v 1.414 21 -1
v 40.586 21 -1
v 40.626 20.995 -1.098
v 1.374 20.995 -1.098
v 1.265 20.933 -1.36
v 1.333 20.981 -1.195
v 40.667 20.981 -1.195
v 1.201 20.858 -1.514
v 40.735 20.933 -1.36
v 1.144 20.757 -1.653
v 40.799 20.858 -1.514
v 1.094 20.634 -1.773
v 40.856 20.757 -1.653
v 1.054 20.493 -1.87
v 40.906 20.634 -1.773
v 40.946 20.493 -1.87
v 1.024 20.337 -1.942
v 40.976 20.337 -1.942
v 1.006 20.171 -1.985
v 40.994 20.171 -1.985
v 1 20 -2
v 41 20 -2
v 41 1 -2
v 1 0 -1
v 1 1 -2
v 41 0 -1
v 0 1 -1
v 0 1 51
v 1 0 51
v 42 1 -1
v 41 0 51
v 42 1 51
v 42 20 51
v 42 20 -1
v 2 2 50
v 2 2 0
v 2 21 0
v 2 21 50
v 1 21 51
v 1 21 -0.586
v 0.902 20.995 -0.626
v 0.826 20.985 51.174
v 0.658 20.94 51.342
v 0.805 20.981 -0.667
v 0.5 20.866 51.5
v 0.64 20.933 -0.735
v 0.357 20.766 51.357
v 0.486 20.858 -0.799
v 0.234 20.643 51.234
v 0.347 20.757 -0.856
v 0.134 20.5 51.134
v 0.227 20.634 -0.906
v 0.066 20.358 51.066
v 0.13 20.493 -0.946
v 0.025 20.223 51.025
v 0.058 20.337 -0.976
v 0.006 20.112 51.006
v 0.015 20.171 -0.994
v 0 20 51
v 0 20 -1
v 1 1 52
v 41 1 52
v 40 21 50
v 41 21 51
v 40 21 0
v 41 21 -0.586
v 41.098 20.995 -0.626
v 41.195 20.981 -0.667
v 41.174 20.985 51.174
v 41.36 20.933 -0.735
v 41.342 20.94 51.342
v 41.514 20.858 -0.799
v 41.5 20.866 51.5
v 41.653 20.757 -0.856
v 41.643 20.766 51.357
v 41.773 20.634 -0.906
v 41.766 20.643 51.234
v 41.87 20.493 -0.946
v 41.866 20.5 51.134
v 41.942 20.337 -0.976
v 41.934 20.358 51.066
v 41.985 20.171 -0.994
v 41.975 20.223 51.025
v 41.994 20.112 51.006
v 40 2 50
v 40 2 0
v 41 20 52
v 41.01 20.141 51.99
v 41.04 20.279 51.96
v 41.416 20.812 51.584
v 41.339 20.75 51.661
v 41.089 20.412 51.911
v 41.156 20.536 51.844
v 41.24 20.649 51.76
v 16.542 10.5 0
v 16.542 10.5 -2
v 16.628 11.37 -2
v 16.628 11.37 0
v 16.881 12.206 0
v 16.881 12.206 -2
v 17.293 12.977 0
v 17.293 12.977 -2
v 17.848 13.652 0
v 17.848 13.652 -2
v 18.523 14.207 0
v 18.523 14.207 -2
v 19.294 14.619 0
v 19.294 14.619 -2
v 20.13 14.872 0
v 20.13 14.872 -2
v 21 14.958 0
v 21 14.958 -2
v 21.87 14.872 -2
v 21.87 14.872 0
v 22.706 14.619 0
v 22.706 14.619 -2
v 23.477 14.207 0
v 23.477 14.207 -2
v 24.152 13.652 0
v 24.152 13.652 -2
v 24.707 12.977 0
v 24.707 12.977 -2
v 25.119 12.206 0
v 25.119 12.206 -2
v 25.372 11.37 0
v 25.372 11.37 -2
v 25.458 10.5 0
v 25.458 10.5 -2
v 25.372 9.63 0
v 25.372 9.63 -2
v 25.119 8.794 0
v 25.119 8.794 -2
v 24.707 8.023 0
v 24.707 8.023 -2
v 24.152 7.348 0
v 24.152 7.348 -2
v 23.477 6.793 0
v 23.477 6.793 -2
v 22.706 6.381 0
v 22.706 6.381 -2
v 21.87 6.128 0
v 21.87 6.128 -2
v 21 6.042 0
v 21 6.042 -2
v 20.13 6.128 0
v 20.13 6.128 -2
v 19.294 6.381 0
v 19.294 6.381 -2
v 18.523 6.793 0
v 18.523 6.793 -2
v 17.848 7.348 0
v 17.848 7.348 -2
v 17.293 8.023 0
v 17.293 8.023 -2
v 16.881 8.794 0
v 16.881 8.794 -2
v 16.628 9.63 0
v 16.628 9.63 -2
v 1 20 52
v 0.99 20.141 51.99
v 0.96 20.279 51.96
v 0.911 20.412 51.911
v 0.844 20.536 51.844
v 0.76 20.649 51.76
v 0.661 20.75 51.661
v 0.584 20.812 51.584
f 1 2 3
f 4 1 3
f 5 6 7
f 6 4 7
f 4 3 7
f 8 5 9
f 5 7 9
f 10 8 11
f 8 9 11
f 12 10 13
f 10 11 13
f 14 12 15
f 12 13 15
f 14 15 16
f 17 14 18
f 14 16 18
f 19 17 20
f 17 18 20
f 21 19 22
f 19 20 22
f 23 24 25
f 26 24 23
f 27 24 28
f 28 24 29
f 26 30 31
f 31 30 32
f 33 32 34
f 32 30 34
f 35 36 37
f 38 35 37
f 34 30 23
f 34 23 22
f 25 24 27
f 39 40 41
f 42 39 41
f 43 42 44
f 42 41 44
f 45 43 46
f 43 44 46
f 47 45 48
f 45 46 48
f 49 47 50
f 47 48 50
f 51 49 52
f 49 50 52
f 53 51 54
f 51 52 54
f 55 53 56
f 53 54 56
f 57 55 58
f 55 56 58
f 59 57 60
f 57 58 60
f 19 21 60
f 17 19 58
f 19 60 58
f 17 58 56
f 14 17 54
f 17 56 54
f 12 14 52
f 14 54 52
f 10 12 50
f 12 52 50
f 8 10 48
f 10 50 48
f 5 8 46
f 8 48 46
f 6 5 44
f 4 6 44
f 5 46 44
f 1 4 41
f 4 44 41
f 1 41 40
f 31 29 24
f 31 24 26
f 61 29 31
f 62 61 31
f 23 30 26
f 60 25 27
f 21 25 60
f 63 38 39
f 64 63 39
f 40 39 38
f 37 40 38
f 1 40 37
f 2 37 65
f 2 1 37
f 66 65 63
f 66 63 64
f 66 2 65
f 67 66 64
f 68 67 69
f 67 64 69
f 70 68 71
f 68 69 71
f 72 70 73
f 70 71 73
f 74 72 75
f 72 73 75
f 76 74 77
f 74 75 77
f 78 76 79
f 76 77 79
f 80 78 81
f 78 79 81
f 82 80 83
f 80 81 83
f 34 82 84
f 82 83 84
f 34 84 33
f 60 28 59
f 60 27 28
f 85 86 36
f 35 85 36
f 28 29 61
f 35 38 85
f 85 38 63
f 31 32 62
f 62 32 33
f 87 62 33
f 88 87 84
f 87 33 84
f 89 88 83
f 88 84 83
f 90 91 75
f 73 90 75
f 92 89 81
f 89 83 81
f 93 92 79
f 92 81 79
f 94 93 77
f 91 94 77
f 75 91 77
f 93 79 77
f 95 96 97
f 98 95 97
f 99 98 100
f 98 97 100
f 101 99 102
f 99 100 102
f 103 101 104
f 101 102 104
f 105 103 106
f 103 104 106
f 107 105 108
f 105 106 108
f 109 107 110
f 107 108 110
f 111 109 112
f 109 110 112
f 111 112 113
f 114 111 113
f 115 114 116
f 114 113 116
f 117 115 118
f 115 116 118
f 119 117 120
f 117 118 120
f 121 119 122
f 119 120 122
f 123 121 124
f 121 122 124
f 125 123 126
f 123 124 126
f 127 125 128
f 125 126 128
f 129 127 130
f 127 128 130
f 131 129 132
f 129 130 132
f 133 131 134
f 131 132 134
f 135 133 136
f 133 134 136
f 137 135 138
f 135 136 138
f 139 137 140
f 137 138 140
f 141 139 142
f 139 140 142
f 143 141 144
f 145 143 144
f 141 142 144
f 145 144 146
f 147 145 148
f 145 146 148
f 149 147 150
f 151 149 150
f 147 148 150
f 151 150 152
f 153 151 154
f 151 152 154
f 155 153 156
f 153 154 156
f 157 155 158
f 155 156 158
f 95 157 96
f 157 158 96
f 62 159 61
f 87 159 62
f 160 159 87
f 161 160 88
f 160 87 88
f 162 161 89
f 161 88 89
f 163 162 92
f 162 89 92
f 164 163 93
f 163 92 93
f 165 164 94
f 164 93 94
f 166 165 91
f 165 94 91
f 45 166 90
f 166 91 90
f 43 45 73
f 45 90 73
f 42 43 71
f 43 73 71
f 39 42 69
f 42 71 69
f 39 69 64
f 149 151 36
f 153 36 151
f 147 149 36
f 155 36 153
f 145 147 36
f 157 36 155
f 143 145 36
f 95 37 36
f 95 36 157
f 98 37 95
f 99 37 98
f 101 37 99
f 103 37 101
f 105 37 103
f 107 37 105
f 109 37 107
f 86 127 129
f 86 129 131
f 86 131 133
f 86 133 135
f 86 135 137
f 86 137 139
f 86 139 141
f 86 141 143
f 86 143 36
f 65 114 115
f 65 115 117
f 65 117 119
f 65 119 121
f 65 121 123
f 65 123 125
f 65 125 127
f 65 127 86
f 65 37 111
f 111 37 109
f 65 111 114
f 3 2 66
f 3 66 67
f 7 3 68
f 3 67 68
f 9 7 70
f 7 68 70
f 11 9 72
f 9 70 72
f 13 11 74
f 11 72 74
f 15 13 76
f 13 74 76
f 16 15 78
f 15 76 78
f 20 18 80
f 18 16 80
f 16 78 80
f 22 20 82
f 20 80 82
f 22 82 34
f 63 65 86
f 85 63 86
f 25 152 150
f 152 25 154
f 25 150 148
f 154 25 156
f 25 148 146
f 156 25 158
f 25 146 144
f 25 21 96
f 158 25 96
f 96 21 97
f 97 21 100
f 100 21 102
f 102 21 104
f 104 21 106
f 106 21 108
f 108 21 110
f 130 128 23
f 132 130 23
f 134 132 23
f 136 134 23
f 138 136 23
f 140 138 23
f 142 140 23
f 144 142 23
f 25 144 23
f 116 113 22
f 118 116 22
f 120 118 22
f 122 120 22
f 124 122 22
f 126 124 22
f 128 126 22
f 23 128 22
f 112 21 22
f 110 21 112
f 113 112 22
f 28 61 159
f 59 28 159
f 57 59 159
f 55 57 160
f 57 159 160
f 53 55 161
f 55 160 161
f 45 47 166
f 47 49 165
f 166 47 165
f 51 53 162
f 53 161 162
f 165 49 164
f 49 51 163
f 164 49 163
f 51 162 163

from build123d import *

# Parameters (mm, degrees)
BOSS_EXTRUDE1_DEPTH = 50
SKETCH1_3_W         = 42
SKETCH1_3_H         = 21
BOSS_EXTRUDE2_DEPTH = 2
BOSS_EXTRUDE3_START = 50
SKETCH1_4_W         = 42
SKETCH1_4_H         = 21
BOSS_EXTRUDE3_DEPTH = 2
SKETCH2_R           = 4.458076667
CUT_EXTRUDE1_DEPTH  = 2
CHAMFER1_SIZE       = 1
FILLET1_R           = 1


with BuildPart() as part:
    # Sketch1 → Boss-Extrude1 (new body)
    with BuildSketch(Plane.XY):
        Polygon((40, 21), (40, 2), (2, 2), (2, 21), (0, 21), (0, 0), (42, 0), (42, 21), align=None)
    extrude(amount=BOSS_EXTRUDE1_DEPTH)

    # Sketch1<3> → Boss-Extrude2 (add)
    with BuildSketch(Plane.XY):
        with Locations((21, 10.5)):
            Rectangle(SKETCH1_3_W, SKETCH1_3_H)
    extrude(amount=-BOSS_EXTRUDE2_DEPTH)

    # Sketch1<4> → Boss-Extrude3 (add)
    with BuildSketch(Plane.XY.offset(BOSS_EXTRUDE3_START)):
        with Locations((21, 10.5)):
            Rectangle(SKETCH1_4_W, SKETCH1_4_H)
    extrude(amount=BOSS_EXTRUDE3_DEPTH)

    # Sketch2 → Cut-Extrude1 (cut)
    with BuildSketch(Plane(origin=(0, 0, -2), x_dir=(-1, 0, 0), z_dir=(0, 0, -1))):
        with Locations((-21, 10.5)):
            Circle(SKETCH2_R)
    extrude(amount=-CUT_EXTRUDE1_DEPTH, mode=Mode.SUBTRACT)

    # Chamfer1
    chamfer1_edges = [part.edges().sort_by_distance(p)[0] for p in [
        (42, 0, 25),
        (0, 0, 25),
        (42, 10.5, -2),
        (21, 0, -2),
        (0, 10.5, -2),
        (42, 10.5, 52),
        (21, 0, 52),
        (0, 10.5, 52),
    ]]
    chamfer(chamfer1_edges, length=CHAMFER1_SIZE)

    # Fillet1
    # the kernel refuses this fillet: 1 mm, written as the material it takes off along each edge
    with BuildSketch(Plane(origin=(43.5, 21, 52), x_dir=(0, 0, -1), z_dir=(-1, 0, 0))) as fillet1_piece_1:
        with BuildLine():
            CenterArc((FILLET1_R, FILLET1_R), FILLET1_R, 180, 90)
            Line((0, FILLET1_R), (0, 0))
            Line((0, 0), (FILLET1_R, 0))
        make_face()
    extrude(amount=45, mode=Mode.SUBTRACT)
    with BuildSketch(Plane(origin=(0, 21, -3.5), x_dir=(1, 0, 0), z_dir=(0, 0, 1)), Plane(origin=(42, 21, 53.5), x_dir=(-1, 0, 0), z_dir=(0, 0, -1))) as fillet1_piece_2:
        with BuildLine():
            CenterArc((FILLET1_R, -FILLET1_R), FILLET1_R, 90, 90)
            Line((0, -FILLET1_R), (0, 0))
            Line((0, 0), (FILLET1_R, 0))
        make_face()
    extrude(amount=57, mode=Mode.SUBTRACT)
    with BuildSketch(Plane(origin=(43.5, 21, -2), x_dir=(0, 0, 1), z_dir=(-1, 0, 0))) as fillet1_piece_3:
        with BuildLine():
            CenterArc((FILLET1_R, -FILLET1_R), FILLET1_R, 90, 90)
            Line((0, -FILLET1_R), (0, 0))
            Line((0, 0), (FILLET1_R, 0))
        make_face()
    extrude(amount=45, mode=Mode.SUBTRACT)
    with BuildSketch(Plane(origin=(-1.767766953, 21, 0.767766953), x_dir=(0.7071067811865476, 0, 0.7071067811865476), z_dir=(0.7071067811865476, 0, -0.7071067811865476))) as fillet1_piece_4:
        with BuildLine():
            CenterArc((FILLET1_R, FILLET1_R), FILLET1_R, 180, 90)
            Line((0, FILLET1_R), (0, 0))
            Line((0, 0), (FILLET1_R, 0))
        make_face()
    extrude(amount=6.414213562, mode=Mode.SUBTRACT)
    with BuildSketch(Plane(origin=(43.767766953, 21, 0.767766953), x_dir=(-0.7071067811865475, 0, 0.7071067811865476), z_dir=(-0.7071067811865476, 0, -0.7071067811865476))) as fillet1_piece_5:
        with BuildLine():
            CenterArc((FILLET1_R, -FILLET1_R), FILLET1_R, 90, 90)
            Line((0, -FILLET1_R), (0, 0))
            Line((0, 0), (FILLET1_R, 0))
        make_face()
    extrude(amount=6.414213562, mode=Mode.SUBTRACT)


solid = part.part
